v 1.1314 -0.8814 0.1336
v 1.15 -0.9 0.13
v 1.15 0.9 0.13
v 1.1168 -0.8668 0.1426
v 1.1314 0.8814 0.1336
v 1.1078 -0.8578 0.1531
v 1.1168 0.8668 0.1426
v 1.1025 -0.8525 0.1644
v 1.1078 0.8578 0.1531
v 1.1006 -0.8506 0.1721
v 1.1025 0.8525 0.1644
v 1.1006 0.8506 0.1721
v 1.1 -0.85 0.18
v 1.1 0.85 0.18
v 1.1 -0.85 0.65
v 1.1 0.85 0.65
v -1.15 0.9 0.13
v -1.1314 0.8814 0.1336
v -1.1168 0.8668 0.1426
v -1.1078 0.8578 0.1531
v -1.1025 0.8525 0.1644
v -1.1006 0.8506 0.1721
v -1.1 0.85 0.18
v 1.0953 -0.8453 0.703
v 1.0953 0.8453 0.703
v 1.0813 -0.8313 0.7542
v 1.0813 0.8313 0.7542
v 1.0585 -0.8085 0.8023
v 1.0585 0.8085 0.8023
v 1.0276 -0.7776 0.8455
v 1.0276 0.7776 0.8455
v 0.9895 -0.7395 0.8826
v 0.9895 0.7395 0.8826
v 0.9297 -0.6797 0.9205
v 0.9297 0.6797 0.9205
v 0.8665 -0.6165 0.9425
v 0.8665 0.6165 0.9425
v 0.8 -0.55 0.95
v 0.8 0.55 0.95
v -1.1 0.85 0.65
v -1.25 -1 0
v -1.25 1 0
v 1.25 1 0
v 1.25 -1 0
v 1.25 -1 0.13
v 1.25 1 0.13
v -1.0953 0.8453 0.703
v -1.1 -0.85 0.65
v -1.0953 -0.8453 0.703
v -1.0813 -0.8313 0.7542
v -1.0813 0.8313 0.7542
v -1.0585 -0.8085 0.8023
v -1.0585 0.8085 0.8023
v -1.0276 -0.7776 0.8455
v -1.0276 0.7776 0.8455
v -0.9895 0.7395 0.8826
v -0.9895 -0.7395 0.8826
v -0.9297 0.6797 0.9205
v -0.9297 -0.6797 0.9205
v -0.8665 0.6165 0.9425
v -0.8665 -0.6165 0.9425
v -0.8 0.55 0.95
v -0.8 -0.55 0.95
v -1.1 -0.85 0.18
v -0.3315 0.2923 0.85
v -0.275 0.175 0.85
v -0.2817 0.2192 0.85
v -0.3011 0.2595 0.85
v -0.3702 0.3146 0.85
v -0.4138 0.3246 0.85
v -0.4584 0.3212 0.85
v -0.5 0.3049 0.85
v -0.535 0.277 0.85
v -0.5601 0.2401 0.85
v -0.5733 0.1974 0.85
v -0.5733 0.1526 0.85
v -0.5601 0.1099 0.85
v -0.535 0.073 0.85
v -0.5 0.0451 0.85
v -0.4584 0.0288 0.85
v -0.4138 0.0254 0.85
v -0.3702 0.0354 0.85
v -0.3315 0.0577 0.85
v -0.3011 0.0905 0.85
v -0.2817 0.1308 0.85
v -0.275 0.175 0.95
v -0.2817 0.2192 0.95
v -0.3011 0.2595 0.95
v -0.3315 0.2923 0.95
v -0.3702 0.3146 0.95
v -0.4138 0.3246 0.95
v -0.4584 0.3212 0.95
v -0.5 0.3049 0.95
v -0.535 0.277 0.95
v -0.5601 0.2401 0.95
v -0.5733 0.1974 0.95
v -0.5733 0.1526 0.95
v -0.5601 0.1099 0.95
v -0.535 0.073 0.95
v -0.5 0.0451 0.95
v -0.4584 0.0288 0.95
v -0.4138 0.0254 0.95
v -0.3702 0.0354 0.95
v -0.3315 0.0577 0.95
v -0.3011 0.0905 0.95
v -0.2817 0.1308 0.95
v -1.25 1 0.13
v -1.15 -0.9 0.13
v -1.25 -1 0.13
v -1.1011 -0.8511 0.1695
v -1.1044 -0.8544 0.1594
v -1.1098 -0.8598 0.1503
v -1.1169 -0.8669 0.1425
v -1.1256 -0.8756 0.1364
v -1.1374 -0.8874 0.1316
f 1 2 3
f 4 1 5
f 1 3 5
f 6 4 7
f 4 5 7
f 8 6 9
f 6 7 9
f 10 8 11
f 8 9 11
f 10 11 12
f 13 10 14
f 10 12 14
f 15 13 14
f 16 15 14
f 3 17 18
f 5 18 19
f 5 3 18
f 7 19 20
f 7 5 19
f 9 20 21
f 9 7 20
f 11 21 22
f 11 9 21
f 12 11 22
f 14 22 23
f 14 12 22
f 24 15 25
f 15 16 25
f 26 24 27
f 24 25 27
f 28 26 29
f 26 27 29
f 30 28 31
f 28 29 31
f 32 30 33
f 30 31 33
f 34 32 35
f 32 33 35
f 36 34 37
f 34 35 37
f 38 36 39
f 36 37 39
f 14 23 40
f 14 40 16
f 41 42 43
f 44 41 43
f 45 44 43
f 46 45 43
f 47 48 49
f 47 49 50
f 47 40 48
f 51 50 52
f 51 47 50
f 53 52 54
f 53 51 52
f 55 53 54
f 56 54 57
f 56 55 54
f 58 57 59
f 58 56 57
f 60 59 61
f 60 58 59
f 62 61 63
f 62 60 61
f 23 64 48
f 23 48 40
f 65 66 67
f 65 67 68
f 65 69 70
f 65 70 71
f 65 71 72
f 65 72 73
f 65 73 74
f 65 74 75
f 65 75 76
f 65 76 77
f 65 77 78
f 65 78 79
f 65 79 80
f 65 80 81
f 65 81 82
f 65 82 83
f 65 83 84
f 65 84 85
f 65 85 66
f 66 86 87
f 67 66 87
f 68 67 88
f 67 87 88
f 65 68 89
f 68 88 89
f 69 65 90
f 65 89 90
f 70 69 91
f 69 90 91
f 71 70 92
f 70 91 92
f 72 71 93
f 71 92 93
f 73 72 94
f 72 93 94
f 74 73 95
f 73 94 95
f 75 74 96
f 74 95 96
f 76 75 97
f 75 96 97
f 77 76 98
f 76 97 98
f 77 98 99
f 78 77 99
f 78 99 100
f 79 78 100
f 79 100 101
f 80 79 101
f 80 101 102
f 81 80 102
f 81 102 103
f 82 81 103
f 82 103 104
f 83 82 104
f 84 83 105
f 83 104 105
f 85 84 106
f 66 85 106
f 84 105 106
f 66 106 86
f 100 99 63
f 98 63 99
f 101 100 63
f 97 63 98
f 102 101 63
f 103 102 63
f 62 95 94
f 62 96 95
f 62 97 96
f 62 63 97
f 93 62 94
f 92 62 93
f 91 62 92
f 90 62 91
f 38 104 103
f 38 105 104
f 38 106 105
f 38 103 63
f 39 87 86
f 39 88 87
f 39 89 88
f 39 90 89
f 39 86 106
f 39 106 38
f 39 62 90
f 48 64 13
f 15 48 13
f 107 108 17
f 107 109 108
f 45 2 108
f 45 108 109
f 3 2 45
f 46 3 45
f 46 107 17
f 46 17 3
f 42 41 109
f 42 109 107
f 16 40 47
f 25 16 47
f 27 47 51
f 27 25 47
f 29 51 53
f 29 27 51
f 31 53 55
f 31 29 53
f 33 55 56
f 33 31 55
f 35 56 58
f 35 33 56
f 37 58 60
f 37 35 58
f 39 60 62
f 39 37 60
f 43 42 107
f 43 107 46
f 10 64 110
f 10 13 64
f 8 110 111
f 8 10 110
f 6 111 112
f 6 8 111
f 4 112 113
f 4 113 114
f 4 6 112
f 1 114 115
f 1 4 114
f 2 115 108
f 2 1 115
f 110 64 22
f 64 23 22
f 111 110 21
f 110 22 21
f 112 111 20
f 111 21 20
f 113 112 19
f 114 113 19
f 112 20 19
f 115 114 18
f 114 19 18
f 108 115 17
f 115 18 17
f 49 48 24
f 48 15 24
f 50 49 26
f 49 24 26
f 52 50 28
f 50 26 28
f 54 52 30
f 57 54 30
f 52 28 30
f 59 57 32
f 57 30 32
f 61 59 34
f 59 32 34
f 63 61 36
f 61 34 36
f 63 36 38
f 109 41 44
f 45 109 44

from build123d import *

# Parameters (mm, degrees)
ESQUISSE1_W             = 2.5
ESQUISSE1_H             = 2
BOSS_EXTRU_1_DEPTH      = 0.13
ESQUISSE2_W             = 2.2
ESQUISSE2_H             = 1.7
BOSS_EXTRU_2_DEPTH      = 0.82
CONG_1_R                = 0.3
ESQUISSE3_R             = 0.15
ENL_V_MAT_EXTRU_1_DEPTH = 0.1
CONG_2_R                = 0.05


with BuildPart() as part:
    # Esquisse1 → Boss.-Extru.1 (new body)
    with BuildSketch(Plane.XY):
        Rectangle(ESQUISSE1_W, ESQUISSE1_H)
    extrude(amount=BOSS_EXTRU_1_DEPTH)

    # Esquisse2 → Boss.-Extru.2 (add)
    with BuildSketch(Plane.XY.offset(0.13)):
        Rectangle(ESQUISSE2_W, ESQUISSE2_H)
    extrude(amount=BOSS_EXTRU_2_DEPTH)

    # Congé1
    cong_1_edges = [part.edges().sort_by_distance(p)[0] for p in [
        (1.1, 0, 0.95),
        (0, 0.85, 0.95),
        (-1.1, 0, 0.95),
        (0, -0.85, 0.95),
    ]]
    fillet(cong_1_edges, radius=CONG_1_R)

    # Esquisse3 → Enlèv. mat.-Extru.1 (cut)
    with BuildSketch(Plane.XY.offset(0.95)):
        with Locations((-0.425, 0.175)):
            Circle(ESQUISSE3_R)
    extrude(amount=-ENL_V_MAT_EXTRU_1_DEPTH, mode=Mode.SUBTRACT)

    # Congé2
    cong_2_edges = [part.edges().sort_by_distance(p)[0] for p in [
        (1.1, 0, 0.13),
        (0, 0.85, 0.13),
        (-1.1, 0, 0.13),
        (0, -0.85, 0.13),
    ]]
    fillet(cong_2_edges, radius=CONG_2_R)


solid = part.part
